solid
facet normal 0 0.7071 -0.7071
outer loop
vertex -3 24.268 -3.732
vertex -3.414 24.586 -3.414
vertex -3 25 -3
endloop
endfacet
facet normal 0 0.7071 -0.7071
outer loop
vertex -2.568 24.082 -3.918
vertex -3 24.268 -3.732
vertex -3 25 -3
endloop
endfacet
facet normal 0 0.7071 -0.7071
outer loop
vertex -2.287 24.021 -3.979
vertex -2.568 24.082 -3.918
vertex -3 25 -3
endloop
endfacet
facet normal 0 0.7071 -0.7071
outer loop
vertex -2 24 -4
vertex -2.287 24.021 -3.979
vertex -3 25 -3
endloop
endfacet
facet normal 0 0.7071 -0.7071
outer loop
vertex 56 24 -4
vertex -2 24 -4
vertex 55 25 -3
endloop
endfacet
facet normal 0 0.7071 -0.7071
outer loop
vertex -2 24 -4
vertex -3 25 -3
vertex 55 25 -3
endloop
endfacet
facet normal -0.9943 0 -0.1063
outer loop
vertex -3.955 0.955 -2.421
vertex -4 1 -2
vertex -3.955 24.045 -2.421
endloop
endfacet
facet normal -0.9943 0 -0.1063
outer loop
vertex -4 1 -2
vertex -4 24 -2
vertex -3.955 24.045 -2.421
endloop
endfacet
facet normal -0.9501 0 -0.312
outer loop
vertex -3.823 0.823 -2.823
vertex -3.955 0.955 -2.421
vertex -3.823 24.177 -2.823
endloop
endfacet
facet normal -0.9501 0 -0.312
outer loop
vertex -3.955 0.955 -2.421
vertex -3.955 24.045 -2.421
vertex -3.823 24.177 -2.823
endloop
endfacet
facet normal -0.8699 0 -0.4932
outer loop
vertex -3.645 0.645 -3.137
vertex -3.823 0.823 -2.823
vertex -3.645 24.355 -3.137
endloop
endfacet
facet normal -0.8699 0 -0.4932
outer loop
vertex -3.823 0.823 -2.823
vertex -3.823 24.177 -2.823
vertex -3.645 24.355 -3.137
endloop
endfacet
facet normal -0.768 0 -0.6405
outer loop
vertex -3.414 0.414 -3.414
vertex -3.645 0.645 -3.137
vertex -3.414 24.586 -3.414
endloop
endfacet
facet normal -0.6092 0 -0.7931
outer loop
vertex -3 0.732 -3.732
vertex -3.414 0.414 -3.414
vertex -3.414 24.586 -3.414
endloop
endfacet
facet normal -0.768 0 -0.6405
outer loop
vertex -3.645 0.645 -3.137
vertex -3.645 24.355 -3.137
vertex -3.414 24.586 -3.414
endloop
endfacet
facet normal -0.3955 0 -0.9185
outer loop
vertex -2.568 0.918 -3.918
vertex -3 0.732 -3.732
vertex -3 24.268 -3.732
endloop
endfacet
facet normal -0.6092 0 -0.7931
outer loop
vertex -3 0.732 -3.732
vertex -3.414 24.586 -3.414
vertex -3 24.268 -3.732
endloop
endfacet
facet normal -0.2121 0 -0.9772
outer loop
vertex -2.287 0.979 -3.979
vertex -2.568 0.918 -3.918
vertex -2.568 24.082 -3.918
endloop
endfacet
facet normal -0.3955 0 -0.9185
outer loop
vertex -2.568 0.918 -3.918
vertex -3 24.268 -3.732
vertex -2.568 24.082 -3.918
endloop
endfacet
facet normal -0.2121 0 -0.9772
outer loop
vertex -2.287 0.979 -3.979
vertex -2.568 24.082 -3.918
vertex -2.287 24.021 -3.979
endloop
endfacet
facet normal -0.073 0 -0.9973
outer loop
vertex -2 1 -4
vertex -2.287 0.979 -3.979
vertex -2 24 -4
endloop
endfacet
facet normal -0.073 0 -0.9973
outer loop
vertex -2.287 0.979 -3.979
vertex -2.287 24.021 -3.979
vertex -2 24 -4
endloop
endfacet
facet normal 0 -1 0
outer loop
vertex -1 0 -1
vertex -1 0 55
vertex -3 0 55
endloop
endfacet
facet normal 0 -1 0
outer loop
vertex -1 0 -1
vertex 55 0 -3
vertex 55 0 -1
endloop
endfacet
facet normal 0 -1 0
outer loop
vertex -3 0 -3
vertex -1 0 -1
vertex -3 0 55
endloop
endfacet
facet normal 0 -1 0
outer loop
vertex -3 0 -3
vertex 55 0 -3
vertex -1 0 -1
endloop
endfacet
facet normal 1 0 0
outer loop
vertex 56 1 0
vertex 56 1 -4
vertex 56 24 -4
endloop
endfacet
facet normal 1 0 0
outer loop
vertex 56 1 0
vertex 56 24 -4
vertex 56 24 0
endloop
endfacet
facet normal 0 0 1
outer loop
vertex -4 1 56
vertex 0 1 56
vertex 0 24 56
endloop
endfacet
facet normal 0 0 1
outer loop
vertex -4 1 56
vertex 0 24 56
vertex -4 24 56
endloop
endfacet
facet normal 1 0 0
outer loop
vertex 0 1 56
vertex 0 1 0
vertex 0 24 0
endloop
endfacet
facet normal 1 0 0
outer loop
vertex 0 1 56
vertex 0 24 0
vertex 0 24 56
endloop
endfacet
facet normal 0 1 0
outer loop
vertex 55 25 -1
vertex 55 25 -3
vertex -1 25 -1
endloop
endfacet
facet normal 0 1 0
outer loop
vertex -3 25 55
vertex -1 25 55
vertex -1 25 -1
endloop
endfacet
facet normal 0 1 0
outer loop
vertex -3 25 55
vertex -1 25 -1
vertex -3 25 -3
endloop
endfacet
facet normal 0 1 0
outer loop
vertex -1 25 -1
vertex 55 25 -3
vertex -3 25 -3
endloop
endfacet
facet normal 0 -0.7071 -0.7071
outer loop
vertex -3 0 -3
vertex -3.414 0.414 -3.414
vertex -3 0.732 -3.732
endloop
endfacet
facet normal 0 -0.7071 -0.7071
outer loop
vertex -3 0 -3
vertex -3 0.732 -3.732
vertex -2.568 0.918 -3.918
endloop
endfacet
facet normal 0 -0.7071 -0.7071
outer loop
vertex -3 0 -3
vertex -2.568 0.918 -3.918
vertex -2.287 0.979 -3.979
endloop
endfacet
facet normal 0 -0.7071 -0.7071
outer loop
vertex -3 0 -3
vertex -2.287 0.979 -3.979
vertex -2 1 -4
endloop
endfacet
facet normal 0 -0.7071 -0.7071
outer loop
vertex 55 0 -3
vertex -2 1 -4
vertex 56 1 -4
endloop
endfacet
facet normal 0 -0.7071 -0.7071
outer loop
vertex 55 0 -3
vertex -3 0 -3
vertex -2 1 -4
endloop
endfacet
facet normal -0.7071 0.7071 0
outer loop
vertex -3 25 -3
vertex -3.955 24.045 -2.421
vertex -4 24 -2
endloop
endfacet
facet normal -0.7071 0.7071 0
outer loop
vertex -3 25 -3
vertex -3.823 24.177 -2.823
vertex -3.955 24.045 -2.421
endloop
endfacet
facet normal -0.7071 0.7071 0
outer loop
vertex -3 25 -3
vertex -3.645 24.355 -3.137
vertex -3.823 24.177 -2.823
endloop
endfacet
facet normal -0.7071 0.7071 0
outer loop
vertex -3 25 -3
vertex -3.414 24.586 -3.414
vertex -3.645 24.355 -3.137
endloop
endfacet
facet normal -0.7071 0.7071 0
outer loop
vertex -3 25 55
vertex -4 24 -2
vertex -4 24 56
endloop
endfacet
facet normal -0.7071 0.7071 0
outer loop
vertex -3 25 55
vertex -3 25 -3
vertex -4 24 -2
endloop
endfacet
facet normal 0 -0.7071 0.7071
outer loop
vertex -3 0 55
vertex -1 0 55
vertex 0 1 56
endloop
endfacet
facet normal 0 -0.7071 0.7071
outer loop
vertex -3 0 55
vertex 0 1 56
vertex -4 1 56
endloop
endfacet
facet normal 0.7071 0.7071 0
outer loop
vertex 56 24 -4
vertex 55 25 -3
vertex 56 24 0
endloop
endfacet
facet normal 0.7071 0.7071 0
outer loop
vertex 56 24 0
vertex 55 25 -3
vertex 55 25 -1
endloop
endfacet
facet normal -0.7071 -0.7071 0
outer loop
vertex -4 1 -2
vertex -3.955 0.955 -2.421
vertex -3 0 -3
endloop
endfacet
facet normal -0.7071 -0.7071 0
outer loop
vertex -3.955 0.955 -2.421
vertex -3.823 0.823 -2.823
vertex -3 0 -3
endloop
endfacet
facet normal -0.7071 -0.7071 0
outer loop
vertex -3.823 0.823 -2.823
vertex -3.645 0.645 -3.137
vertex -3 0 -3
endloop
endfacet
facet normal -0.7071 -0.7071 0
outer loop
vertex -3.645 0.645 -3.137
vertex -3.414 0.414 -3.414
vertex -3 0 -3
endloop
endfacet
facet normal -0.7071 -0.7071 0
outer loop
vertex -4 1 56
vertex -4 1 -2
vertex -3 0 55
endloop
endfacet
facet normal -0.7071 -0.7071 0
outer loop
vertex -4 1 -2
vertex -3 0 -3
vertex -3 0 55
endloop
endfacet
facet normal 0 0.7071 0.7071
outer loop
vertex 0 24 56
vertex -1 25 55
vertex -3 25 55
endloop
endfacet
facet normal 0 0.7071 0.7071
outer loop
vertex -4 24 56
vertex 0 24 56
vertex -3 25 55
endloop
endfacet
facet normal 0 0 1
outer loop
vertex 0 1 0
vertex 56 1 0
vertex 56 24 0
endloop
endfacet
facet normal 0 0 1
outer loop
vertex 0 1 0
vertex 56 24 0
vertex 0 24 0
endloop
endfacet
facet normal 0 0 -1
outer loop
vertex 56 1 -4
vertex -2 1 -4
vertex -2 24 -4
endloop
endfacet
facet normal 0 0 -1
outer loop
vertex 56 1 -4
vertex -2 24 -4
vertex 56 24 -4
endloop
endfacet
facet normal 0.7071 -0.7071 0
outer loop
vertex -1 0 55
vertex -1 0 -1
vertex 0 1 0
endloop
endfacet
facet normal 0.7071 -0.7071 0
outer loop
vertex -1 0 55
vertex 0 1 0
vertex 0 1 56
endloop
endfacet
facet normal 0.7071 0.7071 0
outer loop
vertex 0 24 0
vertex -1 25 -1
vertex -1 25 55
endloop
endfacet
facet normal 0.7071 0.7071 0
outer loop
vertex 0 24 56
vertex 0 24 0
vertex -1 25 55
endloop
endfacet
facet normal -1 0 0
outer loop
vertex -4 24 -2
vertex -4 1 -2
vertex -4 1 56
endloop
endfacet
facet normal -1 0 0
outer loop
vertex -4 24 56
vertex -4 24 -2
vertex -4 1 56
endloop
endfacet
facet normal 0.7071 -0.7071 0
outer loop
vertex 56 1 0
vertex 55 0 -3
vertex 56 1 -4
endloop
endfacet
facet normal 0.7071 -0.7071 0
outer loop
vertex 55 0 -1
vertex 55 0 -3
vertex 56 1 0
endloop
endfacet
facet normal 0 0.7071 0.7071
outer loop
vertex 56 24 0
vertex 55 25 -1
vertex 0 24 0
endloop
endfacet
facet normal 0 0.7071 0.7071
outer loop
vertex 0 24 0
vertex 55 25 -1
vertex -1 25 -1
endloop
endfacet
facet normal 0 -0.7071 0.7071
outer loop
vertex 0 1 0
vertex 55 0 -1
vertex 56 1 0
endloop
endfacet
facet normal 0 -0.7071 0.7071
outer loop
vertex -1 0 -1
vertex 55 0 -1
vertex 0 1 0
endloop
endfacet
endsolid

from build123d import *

# Parameters (mm, degrees)
BOSS_EXTRUDE1_DEPTH = 25
CHAMFER1_SIZE       = 1
FILLET1_R           = 2


with BuildPart() as part:
    # Sketch1 → Boss-Extrude1 (new body)
    with BuildSketch(Plane(origin=(0, 0, 0), x_dir=(1, 0, 0), z_dir=(0, 1, 0))):
        Polygon((0, 0), (0, -56), (-4, -56), (-4, 0), (-4, 4), (56, 4), (56, 0), align=None)
    extrude(amount=BOSS_EXTRUDE1_DEPTH)

    # Chamfer1
    chamfer1_edges = [part.edges().sort_by_distance(p)[0] for p in [
        (28, 0, 0),
        (26, 25, -4),
        (-4, 25, 26),
        (-2, 25, 56),
        (0, 25, 28),
        (28, 25, 0),
        (0, 0, 28),
        (-2, 0, 56),
        (-4, 0, 26),
        (56, 25, -2),
        (26, 0, -4),
        (56, 0, -2),
    ]]
    chamfer(chamfer1_edges, length=CHAMFER1_SIZE)

    # Fillet1
    fillet1_edges = [part.edges().sort_by_distance(p)[0] for p in [
        (-4, 12.5, -4),
    ]]
    fillet(fillet1_edges, radius=FILLET1_R)


solid = part.part
